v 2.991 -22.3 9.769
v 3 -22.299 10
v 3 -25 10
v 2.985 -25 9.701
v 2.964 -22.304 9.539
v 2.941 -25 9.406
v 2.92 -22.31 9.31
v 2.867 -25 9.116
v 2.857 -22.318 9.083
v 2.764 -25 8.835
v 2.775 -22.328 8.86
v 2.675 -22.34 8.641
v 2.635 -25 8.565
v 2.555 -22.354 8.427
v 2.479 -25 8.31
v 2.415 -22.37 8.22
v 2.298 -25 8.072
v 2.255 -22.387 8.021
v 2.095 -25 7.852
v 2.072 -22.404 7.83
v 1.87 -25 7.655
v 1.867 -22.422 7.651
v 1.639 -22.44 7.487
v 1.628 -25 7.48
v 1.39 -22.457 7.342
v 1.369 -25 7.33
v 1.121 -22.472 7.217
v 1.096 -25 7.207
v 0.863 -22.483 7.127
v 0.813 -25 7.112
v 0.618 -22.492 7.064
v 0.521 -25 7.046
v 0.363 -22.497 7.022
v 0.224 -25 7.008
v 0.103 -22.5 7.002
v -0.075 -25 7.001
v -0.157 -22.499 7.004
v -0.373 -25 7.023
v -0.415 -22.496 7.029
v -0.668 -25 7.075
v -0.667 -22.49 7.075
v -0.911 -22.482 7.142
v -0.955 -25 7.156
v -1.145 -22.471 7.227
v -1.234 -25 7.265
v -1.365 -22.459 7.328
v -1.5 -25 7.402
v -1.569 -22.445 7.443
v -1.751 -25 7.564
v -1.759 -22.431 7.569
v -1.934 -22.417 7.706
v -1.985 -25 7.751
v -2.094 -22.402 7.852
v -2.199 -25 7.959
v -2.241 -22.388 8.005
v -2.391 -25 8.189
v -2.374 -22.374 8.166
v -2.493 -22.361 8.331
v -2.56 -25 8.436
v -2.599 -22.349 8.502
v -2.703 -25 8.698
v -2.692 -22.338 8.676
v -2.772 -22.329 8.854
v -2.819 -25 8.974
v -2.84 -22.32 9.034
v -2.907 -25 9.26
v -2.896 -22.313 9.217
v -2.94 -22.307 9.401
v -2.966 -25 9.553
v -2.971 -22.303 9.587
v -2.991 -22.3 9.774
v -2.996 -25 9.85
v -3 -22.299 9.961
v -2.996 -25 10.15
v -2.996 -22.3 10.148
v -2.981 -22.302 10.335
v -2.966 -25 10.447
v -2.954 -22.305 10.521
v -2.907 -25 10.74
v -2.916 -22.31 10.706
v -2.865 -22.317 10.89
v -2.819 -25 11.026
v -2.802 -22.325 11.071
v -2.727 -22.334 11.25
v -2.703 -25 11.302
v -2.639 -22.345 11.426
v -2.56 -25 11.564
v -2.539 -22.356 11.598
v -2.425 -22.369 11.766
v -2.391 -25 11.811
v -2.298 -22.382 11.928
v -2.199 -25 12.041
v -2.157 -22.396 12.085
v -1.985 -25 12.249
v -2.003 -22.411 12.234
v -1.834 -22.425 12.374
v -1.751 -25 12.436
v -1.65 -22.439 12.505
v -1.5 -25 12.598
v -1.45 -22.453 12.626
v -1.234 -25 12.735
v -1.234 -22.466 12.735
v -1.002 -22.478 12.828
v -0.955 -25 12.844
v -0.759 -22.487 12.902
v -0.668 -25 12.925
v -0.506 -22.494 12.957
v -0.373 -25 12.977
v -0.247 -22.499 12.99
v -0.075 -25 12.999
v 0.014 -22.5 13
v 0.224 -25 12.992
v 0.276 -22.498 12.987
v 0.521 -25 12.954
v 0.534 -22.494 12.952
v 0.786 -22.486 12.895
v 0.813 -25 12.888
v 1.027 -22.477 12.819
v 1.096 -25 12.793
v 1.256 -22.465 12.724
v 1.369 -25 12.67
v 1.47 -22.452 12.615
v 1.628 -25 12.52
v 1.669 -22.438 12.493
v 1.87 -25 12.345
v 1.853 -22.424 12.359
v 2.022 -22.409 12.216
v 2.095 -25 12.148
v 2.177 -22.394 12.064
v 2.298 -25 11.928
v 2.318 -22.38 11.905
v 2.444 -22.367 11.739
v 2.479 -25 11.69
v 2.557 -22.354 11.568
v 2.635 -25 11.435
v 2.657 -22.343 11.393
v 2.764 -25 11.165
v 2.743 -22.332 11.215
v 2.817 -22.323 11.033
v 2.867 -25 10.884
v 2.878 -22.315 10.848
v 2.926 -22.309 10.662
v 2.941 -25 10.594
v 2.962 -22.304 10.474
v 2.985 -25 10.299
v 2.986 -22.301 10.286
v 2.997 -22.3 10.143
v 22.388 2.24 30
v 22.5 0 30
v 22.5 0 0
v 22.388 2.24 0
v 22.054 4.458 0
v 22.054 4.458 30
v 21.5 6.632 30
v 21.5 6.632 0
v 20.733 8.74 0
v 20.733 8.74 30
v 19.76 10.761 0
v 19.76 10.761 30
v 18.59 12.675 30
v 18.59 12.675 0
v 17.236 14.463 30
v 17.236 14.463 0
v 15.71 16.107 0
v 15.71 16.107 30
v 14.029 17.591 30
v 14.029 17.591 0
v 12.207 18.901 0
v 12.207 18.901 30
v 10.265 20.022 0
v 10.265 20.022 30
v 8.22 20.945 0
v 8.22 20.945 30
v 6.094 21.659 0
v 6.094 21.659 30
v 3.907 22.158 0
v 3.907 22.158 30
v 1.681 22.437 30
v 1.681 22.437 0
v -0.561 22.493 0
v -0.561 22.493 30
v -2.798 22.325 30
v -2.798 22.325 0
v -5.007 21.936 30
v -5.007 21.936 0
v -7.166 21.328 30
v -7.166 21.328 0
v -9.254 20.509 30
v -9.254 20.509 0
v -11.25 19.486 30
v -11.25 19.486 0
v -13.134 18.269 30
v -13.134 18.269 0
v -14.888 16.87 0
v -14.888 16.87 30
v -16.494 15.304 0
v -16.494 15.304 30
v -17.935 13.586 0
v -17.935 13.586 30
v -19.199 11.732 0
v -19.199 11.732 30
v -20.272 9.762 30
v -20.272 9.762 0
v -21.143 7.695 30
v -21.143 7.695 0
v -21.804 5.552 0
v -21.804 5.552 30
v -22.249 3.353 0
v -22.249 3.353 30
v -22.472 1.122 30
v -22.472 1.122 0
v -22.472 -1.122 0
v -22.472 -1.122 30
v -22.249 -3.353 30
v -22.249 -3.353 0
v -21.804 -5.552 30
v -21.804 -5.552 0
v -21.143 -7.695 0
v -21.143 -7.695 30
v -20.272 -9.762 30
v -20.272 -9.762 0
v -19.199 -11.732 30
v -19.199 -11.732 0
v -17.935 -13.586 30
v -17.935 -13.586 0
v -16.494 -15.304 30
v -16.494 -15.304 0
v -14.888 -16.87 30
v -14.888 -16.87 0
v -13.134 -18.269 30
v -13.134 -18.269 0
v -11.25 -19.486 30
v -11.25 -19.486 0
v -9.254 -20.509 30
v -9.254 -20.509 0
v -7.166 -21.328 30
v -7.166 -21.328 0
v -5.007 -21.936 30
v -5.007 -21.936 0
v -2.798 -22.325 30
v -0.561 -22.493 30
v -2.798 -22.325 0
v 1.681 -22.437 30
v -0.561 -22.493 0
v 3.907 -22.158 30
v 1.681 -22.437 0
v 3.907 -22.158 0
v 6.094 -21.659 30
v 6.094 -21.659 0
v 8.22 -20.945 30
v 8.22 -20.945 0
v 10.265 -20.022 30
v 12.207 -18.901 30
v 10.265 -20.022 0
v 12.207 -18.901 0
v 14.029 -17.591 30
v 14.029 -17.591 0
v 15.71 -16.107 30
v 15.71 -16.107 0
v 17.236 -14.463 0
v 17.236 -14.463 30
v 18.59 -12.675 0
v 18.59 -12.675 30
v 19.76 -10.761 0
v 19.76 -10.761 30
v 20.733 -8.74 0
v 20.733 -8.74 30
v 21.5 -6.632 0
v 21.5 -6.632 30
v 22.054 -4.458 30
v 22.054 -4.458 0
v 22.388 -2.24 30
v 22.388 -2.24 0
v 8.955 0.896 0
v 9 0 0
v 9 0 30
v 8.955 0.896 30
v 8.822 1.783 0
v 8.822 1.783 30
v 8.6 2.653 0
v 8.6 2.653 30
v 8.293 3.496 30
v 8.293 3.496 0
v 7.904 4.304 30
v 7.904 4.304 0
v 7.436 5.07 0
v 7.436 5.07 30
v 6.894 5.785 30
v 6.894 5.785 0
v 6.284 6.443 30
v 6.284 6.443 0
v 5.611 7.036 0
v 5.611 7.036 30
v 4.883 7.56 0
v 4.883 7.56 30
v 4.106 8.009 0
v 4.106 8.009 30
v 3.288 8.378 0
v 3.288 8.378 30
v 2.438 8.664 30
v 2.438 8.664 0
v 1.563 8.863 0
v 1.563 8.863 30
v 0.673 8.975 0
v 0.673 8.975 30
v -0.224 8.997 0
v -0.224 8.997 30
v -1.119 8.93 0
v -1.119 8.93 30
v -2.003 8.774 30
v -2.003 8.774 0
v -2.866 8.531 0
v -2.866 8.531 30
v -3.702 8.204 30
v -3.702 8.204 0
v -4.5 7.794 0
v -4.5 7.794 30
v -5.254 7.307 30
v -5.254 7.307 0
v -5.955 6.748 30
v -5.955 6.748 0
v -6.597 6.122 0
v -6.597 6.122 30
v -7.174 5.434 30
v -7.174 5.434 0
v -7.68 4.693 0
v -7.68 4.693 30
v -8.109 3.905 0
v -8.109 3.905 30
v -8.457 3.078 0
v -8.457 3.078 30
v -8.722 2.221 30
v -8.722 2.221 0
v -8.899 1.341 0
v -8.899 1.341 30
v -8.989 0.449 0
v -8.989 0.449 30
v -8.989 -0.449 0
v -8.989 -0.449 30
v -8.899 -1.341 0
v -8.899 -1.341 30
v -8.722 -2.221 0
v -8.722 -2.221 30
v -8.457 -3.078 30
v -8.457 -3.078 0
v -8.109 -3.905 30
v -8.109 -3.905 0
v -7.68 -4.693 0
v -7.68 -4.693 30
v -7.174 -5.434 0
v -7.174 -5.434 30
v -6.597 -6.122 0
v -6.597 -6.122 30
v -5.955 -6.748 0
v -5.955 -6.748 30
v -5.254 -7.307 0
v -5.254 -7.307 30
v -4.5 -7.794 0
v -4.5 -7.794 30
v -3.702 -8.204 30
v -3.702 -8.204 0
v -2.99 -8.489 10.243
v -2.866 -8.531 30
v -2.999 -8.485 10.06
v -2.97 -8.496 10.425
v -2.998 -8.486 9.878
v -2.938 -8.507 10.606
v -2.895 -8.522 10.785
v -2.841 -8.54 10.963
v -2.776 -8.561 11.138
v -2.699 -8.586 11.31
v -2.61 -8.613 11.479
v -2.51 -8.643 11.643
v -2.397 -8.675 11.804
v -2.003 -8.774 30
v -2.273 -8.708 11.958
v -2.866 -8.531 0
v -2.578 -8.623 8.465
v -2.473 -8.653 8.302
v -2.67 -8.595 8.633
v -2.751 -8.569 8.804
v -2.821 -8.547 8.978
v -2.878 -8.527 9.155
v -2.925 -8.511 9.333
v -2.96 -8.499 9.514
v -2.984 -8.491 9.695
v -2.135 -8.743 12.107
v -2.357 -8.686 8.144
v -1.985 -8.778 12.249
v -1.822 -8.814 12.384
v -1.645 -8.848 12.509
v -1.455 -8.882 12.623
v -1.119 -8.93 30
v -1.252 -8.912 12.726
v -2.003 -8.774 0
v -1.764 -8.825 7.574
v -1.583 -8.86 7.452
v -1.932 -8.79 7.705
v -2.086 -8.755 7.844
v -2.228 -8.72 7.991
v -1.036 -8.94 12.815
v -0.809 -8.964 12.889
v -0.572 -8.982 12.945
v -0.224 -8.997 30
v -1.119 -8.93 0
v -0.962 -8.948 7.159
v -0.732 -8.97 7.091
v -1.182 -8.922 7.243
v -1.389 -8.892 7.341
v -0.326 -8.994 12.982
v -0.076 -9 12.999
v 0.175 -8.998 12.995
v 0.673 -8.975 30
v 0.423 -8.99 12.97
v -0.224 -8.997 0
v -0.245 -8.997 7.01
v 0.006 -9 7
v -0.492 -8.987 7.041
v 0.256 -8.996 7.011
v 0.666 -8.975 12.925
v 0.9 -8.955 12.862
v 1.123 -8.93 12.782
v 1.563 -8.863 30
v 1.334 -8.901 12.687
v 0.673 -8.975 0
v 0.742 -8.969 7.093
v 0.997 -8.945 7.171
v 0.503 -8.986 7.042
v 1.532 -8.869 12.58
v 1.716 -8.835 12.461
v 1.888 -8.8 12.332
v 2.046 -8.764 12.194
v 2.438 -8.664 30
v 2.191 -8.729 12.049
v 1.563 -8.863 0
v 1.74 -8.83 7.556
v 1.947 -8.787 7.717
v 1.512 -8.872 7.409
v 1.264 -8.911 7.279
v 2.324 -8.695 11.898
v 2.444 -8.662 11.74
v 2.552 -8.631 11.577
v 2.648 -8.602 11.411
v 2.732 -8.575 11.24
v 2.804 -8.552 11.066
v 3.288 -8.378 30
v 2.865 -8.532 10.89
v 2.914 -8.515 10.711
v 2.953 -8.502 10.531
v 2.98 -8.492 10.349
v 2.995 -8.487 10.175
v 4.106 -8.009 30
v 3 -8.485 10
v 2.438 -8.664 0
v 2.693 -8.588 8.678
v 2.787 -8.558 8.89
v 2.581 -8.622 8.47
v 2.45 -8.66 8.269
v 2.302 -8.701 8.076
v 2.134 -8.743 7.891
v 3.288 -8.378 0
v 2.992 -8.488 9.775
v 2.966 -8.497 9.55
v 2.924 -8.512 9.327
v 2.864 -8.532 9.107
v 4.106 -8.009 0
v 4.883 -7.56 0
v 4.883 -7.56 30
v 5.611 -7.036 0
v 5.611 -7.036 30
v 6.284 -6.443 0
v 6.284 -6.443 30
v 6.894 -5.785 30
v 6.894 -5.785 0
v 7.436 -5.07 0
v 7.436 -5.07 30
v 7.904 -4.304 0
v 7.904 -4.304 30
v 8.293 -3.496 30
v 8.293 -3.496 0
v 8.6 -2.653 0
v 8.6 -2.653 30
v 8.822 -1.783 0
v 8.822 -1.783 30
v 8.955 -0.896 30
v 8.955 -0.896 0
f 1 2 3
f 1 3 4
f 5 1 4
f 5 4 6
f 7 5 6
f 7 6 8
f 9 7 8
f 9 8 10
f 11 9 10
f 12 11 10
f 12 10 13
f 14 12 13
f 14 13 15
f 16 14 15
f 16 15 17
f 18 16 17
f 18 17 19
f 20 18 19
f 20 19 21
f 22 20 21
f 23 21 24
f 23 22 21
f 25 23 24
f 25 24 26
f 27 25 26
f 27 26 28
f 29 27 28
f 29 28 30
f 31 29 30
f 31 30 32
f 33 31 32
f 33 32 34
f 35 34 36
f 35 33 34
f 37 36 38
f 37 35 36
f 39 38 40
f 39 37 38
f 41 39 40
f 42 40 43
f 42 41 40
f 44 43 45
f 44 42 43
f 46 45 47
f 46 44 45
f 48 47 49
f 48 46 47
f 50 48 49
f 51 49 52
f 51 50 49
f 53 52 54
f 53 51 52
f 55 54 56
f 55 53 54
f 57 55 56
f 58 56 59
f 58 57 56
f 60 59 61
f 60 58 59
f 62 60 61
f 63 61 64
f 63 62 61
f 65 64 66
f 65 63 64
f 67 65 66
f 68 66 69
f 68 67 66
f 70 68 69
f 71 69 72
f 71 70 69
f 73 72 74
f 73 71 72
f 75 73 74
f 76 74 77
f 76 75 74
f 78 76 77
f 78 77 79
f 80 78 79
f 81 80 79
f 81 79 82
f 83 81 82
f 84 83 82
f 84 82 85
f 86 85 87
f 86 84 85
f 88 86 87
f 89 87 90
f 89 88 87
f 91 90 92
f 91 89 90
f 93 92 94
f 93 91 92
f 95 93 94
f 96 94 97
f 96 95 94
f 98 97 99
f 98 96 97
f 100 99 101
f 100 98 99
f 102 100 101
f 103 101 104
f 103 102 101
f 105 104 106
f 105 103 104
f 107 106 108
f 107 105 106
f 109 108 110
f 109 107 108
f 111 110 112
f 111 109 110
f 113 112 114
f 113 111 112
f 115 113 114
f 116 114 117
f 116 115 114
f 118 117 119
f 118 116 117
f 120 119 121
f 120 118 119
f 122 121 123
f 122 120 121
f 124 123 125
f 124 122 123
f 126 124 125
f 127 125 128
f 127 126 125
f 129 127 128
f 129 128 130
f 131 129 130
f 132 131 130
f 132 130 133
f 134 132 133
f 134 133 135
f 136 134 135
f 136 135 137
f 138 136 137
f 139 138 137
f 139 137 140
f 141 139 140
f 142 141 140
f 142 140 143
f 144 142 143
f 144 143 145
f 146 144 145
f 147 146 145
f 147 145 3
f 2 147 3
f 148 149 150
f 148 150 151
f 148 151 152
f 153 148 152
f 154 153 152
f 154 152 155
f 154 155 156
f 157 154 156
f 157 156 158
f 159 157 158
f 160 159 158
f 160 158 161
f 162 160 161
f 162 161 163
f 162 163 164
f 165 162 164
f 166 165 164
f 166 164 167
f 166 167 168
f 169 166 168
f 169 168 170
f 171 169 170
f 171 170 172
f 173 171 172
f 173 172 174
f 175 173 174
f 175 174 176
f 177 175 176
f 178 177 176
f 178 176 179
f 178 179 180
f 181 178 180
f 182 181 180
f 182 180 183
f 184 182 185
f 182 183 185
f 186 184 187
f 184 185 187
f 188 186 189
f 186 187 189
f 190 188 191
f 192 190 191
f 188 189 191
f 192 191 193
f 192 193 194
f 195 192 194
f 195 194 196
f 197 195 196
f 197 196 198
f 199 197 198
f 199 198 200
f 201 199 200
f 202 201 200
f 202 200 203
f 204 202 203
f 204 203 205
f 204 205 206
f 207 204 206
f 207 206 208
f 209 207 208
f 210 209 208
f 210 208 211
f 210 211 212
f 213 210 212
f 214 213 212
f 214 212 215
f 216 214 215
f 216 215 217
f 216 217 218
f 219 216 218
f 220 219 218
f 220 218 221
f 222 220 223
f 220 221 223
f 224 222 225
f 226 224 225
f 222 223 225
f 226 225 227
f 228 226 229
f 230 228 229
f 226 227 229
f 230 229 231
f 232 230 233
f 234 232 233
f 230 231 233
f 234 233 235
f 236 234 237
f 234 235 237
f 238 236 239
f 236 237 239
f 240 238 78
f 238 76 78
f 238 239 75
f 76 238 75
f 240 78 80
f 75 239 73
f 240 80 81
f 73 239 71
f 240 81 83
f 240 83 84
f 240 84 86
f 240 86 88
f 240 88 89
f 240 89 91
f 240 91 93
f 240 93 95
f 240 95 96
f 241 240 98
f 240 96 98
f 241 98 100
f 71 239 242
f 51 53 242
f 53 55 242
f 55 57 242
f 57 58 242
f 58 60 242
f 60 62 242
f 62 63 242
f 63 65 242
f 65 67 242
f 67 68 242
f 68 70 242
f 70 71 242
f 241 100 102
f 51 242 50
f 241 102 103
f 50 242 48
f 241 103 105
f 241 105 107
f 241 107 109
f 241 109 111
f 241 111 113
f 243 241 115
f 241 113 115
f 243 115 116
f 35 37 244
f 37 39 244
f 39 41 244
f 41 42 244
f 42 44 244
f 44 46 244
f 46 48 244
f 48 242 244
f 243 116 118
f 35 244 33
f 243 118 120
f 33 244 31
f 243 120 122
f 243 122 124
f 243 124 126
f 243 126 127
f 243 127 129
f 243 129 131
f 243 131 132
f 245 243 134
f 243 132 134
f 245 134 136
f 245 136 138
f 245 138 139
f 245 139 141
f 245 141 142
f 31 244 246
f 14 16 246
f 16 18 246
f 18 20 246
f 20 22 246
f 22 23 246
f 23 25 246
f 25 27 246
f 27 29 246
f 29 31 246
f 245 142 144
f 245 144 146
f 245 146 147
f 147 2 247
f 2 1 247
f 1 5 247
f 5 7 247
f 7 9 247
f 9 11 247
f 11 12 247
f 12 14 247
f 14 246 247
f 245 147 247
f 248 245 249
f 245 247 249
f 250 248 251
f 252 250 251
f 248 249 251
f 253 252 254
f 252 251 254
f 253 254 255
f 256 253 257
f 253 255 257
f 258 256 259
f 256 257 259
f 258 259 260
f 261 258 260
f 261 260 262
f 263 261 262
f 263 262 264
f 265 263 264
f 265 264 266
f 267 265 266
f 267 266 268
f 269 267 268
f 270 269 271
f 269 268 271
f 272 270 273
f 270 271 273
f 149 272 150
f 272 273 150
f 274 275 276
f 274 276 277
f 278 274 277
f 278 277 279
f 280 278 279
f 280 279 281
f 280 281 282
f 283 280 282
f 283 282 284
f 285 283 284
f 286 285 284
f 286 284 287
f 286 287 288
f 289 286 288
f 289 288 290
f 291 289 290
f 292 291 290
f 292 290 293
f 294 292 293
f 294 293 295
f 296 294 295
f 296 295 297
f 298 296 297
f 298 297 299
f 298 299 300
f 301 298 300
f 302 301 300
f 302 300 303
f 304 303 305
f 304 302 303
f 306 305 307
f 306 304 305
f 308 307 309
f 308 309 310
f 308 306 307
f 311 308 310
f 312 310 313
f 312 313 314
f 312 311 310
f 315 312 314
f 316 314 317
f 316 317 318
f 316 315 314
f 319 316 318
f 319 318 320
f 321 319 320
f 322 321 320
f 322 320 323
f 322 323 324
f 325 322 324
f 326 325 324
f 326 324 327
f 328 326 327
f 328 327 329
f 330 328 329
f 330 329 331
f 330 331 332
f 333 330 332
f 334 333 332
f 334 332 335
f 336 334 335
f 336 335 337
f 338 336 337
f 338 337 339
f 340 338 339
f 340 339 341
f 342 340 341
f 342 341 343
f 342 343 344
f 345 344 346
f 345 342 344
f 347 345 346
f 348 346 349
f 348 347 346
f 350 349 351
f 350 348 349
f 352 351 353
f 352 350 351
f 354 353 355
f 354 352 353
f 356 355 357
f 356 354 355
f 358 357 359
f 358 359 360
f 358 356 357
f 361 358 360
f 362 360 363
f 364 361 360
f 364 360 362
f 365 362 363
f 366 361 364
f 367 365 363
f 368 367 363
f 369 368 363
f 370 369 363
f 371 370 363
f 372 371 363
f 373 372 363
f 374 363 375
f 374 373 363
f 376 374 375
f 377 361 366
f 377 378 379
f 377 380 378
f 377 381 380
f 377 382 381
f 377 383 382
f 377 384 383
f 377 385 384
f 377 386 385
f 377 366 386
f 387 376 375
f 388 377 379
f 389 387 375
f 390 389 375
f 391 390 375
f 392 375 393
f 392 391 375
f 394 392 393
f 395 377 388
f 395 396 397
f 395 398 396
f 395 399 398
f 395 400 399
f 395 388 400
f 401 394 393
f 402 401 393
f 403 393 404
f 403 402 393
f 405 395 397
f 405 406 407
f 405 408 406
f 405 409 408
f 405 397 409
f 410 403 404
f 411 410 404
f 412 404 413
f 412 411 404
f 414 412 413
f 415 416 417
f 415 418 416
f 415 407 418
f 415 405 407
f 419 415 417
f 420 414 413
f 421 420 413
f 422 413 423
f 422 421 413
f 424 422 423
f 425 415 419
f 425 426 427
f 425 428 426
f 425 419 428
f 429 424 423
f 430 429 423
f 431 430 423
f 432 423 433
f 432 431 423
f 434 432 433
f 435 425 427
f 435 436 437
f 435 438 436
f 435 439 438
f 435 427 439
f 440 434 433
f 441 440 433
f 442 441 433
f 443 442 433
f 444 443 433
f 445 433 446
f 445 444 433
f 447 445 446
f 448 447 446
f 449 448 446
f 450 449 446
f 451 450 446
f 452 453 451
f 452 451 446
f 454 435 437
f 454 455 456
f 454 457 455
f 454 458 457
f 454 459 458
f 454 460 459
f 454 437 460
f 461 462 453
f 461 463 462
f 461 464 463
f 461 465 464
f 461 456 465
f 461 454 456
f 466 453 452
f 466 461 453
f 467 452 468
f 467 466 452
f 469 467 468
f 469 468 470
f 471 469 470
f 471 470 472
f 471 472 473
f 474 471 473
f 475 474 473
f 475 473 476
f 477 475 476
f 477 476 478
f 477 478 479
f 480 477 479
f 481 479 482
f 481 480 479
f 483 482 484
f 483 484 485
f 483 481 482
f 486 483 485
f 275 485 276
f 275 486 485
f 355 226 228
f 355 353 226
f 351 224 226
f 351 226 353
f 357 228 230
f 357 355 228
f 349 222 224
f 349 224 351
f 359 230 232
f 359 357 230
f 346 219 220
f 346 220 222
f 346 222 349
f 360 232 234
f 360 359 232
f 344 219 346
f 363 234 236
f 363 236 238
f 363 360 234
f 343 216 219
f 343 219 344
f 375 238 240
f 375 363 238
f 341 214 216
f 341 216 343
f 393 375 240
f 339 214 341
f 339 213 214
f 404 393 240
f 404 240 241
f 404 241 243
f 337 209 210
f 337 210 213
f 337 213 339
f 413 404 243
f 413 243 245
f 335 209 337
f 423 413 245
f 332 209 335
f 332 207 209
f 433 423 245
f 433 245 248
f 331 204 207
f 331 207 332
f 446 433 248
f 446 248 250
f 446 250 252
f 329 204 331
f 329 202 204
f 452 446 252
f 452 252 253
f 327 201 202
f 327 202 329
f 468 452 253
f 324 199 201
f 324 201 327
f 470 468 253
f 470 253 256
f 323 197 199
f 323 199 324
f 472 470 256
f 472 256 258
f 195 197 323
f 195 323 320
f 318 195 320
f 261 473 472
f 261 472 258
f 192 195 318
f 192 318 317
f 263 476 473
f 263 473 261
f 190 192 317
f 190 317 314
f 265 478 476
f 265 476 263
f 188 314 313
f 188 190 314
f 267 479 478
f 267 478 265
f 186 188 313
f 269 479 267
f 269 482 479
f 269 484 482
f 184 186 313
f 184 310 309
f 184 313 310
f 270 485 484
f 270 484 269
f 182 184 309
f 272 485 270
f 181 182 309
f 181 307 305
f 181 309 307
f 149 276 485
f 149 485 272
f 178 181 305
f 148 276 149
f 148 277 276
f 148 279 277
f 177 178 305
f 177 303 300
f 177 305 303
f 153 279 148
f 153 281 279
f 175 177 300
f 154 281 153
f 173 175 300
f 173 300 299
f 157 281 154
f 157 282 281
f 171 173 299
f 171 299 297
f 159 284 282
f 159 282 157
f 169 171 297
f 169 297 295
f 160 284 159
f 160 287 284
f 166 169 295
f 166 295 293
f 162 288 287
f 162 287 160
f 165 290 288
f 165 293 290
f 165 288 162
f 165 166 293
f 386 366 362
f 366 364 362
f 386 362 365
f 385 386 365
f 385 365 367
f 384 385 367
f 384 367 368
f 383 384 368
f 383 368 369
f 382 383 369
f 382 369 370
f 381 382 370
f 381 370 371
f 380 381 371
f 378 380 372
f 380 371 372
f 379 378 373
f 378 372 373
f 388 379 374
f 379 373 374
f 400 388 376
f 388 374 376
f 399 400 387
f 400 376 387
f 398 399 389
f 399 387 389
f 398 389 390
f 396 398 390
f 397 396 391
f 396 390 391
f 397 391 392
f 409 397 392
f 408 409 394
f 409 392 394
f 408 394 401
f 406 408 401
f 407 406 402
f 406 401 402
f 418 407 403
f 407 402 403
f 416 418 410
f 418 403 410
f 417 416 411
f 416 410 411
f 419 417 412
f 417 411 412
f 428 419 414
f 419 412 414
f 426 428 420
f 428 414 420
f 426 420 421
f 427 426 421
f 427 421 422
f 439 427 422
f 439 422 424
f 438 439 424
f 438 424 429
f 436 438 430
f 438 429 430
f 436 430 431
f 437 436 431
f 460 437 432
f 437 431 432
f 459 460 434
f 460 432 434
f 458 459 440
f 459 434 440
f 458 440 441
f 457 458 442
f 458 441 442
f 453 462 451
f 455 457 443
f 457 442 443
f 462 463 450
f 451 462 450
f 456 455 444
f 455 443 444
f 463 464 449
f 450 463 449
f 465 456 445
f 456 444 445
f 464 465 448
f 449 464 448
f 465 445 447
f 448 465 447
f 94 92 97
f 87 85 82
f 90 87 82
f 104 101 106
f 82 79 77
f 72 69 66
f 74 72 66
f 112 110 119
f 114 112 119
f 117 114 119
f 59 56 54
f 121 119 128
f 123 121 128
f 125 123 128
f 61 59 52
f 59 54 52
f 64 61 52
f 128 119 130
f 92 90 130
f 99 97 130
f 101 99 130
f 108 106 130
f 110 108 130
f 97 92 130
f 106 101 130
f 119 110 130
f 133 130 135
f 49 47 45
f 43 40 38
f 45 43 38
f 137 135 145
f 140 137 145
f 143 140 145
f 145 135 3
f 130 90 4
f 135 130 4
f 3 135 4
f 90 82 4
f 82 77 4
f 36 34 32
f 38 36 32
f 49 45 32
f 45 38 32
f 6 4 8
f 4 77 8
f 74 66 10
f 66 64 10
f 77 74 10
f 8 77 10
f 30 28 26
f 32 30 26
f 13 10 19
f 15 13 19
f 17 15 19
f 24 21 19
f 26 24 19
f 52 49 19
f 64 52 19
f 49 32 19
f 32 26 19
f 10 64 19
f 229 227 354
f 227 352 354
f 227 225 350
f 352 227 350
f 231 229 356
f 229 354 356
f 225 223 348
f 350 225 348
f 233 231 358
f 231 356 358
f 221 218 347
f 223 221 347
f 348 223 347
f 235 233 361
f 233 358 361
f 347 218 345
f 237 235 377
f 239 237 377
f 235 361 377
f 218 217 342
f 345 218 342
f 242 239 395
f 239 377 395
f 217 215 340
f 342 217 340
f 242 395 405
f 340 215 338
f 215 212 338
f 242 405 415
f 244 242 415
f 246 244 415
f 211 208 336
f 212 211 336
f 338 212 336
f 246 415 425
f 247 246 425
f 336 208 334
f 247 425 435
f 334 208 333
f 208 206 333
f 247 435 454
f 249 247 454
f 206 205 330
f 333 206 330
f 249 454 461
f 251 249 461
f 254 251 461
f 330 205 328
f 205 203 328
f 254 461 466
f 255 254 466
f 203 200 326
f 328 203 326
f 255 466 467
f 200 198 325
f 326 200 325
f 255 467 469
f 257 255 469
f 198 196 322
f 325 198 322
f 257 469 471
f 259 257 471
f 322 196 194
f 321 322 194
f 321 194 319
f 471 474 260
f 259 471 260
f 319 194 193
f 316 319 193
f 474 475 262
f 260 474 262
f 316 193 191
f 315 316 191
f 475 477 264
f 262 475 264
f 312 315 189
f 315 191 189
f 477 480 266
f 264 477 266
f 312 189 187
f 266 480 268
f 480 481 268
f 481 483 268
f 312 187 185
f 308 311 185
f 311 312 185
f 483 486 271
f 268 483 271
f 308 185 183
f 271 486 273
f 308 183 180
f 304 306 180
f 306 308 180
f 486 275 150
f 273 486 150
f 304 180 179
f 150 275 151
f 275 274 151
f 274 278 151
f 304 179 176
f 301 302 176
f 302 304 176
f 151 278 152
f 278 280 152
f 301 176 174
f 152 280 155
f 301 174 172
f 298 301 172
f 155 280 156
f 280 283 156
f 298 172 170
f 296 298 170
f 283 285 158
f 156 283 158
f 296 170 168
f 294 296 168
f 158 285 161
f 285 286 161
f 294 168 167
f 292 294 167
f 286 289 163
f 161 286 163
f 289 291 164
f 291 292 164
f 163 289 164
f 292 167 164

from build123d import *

# Parameters (mm, degrees)
SCHIZZO1_R                   = 22.5
SCHIZZO1_R_2                 = 9
ESTRUSIONE_ESTRUSIONE1_DEPTH = 30
SCHIZZO3_R                   = 3
ESTRUSIONE_ESTRUSIONE2_DEPTH = 25
SCHIZZO4_R                   = 9
TAGLIO_ESTRUSIONE1_DEPTH     = 40


with BuildPart() as part:
    # Schizzo1 → Estrusione-Estrusione1 (new body)
    with BuildSketch(Plane.XY):
        Circle(SCHIZZO1_R)
        Circle(SCHIZZO1_R_2, mode=Mode.SUBTRACT)
    extrude(amount=ESTRUSIONE_ESTRUSIONE1_DEPTH)

    # Schizzo3 → Estrusione-Estrusione2 (add)
    with BuildSketch(Plane(origin=(0, 0, 0), x_dir=(1, 0, 0), z_dir=(0, 1, 0))):
        with Locations((0, -10)):
            Circle(SCHIZZO3_R)
    extrude(amount=-ESTRUSIONE_ESTRUSIONE2_DEPTH)

    # Schizzo4 → Taglio-Estrusione1 (cut)
    with BuildSketch(Plane.XY.offset(30)):
        Circle(SCHIZZO4_R)
    extrude(amount=-TAGLIO_ESTRUSIONE1_DEPTH, mode=Mode.SUBTRACT)


solid = part.part
